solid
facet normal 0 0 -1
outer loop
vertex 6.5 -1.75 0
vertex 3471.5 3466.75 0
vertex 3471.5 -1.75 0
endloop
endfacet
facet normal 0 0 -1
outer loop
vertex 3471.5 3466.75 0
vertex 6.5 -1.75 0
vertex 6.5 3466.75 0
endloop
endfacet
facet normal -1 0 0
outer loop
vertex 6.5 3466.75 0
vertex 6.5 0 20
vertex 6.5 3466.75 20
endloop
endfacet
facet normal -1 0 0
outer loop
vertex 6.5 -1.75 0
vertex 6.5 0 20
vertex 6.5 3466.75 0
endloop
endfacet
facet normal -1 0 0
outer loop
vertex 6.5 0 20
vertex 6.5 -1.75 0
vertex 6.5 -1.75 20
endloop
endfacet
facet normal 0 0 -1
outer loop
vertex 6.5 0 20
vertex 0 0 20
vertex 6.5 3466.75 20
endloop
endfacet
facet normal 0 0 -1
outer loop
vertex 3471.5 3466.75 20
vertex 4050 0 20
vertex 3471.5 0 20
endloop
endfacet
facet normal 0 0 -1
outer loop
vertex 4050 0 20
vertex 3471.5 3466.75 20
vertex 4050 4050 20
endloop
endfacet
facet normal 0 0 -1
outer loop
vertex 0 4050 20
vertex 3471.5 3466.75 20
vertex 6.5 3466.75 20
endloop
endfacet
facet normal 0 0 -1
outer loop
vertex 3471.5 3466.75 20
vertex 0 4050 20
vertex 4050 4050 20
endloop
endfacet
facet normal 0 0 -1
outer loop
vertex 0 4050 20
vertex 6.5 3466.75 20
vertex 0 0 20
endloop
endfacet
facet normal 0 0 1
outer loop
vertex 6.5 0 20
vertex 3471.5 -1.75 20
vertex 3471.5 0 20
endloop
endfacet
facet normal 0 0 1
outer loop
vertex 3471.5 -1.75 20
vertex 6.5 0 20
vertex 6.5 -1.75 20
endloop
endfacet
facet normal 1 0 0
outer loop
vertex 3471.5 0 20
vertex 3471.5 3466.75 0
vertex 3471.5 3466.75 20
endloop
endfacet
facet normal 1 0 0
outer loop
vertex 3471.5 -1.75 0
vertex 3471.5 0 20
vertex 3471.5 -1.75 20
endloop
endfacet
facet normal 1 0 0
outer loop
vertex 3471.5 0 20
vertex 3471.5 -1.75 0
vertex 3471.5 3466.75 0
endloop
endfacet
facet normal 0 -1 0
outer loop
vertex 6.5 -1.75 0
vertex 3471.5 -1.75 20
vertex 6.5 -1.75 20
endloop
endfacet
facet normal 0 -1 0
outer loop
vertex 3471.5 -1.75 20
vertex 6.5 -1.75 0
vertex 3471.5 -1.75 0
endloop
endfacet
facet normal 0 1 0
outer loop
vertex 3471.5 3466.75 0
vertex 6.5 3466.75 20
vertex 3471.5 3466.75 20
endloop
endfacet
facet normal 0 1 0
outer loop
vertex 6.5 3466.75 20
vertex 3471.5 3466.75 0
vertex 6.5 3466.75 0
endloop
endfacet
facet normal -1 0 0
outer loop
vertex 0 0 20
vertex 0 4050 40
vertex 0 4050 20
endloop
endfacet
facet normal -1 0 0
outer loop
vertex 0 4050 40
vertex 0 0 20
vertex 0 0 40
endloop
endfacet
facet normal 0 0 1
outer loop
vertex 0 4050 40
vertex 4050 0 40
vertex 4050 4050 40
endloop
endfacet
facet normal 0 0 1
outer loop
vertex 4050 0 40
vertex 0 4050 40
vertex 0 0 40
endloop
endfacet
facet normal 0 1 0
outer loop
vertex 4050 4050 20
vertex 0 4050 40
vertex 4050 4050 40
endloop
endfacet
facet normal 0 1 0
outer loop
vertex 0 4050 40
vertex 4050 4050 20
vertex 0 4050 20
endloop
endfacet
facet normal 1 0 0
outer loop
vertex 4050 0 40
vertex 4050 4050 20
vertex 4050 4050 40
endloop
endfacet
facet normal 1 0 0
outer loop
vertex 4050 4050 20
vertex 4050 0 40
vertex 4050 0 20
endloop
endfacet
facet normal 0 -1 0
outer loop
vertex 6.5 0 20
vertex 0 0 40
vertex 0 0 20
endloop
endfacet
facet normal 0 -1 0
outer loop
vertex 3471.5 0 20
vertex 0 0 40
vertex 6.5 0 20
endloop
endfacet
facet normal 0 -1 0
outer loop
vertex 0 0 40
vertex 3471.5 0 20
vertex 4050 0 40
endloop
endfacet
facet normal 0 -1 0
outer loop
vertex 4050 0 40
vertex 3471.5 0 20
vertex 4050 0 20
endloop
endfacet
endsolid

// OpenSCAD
// Dimensions in mm
X = 90;
Y = 45;
Z = 20;

// Slide dimensions
slide_X = 75;
slide_Y = 25;
slide_Z = 1;

// Slot dimensions
slot_X = slide_X + 2; // slot length is slide length plus 2mm on each side
slot_Y = 1.6;
slot_Z = 10;
slot_gap_Y = 3.5;

// Build the base block
translate([0, 0, Z]) {
    linear_extrude(Z) {
        square(X * Y);
    }
}

// Cut parallel slots into the top face
translate([X/2 - slot_X/2, Y/2 - (Y/2 + slot_gap_Y/2), 0]) { // moved to z=0
    for (y = [0, slot_gap_Y]) {
        translate([0, y, 0])
            linear_extrude(Z) {
                square(slot_X * Y);
            }
    }
}
